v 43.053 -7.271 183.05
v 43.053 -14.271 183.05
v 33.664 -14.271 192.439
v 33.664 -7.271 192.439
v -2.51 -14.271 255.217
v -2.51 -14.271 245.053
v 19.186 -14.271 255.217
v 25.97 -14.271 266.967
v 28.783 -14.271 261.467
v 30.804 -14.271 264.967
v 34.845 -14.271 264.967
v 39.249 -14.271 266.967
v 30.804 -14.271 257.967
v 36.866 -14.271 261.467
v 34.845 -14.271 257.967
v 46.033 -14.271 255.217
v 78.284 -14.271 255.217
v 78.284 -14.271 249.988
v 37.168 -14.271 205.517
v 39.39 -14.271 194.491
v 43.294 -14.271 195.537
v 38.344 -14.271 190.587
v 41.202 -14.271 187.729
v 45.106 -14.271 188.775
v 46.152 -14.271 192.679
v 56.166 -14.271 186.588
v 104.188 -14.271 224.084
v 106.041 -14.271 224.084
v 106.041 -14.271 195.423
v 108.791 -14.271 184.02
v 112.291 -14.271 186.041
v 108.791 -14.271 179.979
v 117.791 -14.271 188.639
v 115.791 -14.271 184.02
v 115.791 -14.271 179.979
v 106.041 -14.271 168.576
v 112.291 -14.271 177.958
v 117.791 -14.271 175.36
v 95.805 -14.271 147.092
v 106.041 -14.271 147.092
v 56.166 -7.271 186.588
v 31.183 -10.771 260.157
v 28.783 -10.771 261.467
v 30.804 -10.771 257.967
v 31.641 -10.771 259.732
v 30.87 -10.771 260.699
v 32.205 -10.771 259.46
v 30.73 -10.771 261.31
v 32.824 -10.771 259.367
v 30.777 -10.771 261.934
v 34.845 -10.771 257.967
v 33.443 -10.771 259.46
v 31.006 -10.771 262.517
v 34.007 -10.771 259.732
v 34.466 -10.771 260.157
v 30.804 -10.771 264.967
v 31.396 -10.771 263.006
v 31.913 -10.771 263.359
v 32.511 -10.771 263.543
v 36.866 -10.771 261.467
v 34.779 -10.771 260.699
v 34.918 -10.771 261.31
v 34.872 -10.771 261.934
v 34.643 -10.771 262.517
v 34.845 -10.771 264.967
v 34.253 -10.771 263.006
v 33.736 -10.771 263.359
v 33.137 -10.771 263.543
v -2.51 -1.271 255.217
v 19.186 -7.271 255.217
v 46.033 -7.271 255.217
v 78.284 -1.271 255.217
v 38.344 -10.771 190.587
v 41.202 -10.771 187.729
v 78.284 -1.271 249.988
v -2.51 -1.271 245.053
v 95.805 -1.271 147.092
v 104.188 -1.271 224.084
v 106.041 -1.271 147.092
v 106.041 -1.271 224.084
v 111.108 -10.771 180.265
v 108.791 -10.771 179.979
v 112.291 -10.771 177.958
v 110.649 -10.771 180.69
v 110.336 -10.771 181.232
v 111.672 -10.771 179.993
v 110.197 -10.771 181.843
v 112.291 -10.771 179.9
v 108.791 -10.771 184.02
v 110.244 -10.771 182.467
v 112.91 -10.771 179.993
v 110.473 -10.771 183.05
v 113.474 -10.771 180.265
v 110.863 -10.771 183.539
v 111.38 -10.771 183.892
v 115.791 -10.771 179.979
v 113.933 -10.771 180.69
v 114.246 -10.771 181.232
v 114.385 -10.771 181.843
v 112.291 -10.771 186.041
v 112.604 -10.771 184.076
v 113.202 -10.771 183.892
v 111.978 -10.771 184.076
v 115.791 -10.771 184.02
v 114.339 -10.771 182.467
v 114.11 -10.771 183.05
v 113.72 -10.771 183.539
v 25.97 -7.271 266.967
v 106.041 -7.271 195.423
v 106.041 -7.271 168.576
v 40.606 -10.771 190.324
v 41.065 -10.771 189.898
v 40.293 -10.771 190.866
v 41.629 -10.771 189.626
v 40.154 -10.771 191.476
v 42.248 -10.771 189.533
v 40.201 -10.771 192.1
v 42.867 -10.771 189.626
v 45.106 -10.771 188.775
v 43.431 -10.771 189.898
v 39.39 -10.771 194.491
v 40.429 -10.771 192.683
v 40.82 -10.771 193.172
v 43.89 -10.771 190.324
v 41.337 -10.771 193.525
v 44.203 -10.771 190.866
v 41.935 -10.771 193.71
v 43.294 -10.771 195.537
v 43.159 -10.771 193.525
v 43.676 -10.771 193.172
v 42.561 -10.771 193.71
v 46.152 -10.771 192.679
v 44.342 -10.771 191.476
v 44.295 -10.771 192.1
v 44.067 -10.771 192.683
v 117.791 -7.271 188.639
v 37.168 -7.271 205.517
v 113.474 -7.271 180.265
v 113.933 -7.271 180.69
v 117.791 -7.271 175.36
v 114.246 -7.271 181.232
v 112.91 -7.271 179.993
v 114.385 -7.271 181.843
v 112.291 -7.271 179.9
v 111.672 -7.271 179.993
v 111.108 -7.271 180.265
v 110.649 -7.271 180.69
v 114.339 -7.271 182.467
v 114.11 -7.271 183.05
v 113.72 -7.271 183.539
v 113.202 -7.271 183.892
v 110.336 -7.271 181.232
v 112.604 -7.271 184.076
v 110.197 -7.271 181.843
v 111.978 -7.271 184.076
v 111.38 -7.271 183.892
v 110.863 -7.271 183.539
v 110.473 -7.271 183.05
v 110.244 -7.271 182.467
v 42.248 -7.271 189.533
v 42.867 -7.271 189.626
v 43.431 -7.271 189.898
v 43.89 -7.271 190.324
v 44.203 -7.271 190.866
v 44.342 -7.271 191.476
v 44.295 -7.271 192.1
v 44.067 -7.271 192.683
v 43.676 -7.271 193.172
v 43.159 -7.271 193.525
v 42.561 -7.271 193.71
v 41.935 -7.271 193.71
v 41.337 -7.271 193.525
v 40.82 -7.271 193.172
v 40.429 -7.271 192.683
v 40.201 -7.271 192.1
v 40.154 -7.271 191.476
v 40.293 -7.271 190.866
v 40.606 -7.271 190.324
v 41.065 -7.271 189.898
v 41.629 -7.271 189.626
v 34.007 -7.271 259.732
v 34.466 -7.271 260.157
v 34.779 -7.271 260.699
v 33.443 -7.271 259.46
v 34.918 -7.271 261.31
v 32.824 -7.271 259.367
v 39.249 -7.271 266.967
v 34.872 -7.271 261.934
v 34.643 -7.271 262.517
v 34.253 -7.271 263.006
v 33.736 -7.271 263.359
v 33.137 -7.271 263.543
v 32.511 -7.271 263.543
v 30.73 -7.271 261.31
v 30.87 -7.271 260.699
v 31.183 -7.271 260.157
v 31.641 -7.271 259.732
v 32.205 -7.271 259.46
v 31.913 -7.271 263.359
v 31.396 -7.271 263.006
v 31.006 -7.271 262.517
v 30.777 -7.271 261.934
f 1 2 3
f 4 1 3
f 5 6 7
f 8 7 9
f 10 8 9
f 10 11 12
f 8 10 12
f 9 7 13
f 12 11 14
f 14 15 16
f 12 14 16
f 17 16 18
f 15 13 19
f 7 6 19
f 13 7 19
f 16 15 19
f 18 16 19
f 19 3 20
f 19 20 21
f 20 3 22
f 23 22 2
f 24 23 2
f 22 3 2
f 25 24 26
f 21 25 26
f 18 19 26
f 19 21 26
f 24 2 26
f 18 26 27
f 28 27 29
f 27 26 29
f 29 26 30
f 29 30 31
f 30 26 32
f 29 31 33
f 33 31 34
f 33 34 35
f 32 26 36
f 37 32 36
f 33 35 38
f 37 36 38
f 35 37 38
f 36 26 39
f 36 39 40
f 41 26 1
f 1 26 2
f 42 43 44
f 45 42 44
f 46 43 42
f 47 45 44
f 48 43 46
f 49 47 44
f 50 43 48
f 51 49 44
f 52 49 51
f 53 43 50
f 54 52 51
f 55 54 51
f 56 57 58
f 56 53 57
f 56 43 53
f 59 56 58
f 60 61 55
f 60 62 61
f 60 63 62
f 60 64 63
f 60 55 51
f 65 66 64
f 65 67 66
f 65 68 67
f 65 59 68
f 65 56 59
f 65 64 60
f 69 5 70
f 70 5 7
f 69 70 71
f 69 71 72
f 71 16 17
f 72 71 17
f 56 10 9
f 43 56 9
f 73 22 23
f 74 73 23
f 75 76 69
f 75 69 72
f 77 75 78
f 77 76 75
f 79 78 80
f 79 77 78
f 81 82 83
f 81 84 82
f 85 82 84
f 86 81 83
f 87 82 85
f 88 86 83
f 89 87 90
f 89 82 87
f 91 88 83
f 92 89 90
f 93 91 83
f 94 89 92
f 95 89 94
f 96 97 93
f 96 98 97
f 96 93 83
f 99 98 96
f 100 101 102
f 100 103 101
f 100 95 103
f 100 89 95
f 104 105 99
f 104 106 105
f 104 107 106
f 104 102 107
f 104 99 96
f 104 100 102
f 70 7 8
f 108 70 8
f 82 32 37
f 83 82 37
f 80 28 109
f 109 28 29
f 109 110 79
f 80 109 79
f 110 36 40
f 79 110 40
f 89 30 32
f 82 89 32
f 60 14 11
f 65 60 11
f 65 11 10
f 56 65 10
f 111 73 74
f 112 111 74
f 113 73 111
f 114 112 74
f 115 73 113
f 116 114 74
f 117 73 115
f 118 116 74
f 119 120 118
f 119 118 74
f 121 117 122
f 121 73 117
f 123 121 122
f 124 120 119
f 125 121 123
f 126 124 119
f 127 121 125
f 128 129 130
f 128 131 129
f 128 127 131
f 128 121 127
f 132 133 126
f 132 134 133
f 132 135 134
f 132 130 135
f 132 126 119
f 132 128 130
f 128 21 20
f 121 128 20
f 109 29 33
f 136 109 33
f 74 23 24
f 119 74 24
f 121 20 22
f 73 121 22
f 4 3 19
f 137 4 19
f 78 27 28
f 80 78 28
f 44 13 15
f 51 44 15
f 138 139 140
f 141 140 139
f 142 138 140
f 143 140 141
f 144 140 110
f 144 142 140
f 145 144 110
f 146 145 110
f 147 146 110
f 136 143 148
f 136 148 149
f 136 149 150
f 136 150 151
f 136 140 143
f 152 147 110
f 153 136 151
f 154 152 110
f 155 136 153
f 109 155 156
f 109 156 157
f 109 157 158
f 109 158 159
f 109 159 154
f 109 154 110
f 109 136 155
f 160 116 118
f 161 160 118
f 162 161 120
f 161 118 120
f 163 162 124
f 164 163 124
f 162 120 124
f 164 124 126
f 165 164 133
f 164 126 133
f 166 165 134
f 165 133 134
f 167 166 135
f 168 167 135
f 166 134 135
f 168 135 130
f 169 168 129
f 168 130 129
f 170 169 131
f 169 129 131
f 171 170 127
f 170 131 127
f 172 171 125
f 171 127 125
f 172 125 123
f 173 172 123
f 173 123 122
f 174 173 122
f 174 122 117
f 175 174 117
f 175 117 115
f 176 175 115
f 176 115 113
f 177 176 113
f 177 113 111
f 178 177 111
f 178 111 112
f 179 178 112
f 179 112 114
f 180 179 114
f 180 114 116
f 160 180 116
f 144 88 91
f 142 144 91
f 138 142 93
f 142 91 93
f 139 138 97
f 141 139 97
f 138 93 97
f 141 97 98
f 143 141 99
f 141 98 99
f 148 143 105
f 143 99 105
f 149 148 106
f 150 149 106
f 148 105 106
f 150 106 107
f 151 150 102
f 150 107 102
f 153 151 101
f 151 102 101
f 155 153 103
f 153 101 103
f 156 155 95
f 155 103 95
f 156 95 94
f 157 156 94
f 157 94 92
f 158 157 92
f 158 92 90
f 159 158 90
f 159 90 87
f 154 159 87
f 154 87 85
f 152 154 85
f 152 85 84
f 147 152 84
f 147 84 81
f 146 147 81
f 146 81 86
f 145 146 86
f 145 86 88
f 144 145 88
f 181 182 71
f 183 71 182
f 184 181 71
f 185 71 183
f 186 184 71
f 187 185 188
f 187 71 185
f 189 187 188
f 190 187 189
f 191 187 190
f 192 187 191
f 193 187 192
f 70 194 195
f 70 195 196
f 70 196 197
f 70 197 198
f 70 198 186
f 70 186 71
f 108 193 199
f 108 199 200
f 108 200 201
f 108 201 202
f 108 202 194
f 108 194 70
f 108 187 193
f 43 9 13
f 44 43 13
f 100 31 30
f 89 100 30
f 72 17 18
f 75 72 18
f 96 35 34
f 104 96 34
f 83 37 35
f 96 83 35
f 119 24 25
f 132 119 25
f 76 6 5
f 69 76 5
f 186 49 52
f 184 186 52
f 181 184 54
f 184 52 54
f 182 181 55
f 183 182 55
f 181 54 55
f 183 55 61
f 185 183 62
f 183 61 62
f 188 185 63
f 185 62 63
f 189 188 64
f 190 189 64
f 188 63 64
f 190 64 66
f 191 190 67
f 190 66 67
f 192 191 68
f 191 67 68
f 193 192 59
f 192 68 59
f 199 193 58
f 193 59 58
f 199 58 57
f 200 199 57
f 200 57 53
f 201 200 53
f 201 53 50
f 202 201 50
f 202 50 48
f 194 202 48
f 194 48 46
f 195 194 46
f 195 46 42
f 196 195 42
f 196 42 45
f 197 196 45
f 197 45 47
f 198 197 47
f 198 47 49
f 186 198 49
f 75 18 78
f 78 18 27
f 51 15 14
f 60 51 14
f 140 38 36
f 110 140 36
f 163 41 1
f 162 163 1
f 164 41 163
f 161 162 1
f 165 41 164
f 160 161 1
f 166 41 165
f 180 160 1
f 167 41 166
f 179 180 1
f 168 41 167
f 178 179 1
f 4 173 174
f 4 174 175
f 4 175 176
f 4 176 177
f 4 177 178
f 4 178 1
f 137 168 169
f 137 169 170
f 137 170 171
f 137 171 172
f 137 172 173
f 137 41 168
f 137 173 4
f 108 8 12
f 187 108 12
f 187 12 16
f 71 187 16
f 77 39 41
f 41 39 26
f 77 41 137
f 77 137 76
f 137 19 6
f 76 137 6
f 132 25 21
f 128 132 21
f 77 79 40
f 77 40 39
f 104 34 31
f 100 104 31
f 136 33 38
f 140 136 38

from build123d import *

# Parameters (mm, degrees)
BOSS_EXTRUDE1_DEPTH = 13
BOSS_EXTRUDE2_DEPTH = 7
SKETCH3_R           = 2.1
CUT_EXTRUDE1_DEPTH  = 293.087257838
CUT_EXTRUDE2_DEPTH  = 3.5


with BuildPart() as part:
    # Sketch1 → Boss-Extrude1 (new body)
    with BuildSketch(Plane(origin=(0, -14.270631866, 0), x_dir=(-1, 0, 0), z_dir=(0, -1, 0))):
        Polygon((-95.804533303, -147.092026732), (2.510114699, -245.053270909), (2.510114699, -255.216605782), (-78.283971389, -255.216605782), (-78.283971389, -249.988254121), (-104.187777311, -224.084448198), (-106.041330702, -224.084448198), (-106.041330702, -147.092026732), align=None)
    extrude(amount=-BOSS_EXTRUDE1_DEPTH)

    # Sketch2 → Boss-Extrude2 (add)
    with BuildSketch(Plane.XZ.offset(14.270631866)):
        Polygon((37.243094616, 205.795877803), (-2.510114699, 245.406189427), (-2.510114699, 254.966605782), (19.041650219, 254.966605782), (25.96985345, 266.966605782), (39.248909641, 266.966605782), (46.177112871, 254.966605782), (78.033971389, 254.966605782), (78.033971389, 249.88470073), (104.084223921, 223.834448198), (105.791330702, 223.834448198), (105.791330702, 195.567357996), (117.791330702, 188.639154765), (117.791330702, 175.360098574), (105.791330702, 168.431895344), (105.791330702, 147.092026732), (96.158725005, 147.092026732), (56.444502381, 186.663491807), (43.053372765, 183.04954817), (33.664085816, 192.438835119), align=None)
    extrude(amount=-BOSS_EXTRUDE2_DEPTH)

    # Sketch3 → Cut-Extrude1 (cut, through all)
    with BuildSketch(Plane.XZ.offset(14.270631866)):
        with Locations(Location((42.248028453, 191.633067075, 0), (0, 0, 270))):
            Circle(SKETCH3_R)
        with Locations(Location((32.824351589, 261.466605782, 0), (0, 0, 270))):
            Circle(SKETCH3_R)
        with Locations(Location((112.291330702, 181.99962667, 0), (0, 0, 270))):
            Circle(SKETCH3_R)
    extrude(amount=-CUT_EXTRUDE1_DEPTH, mode=Mode.SUBTRACT)

    # Sketch4 → Cut-Extrude2 (cut)
    with BuildSketch(Plane.XZ.offset(14.270631866)):
        Polygon((36.865803473, 261.466605782), (34.845077531, 264.966605782), (30.803625647, 264.966605782), (28.782899705, 261.466605782), (30.803625647, 257.966605782), (34.845077531, 257.966605782), align=None)
        Polygon((46.151771204, 192.679071793), (43.29403317, 195.536809826), (39.39029042, 194.490805109), (38.344285702, 190.587062358), (41.202023735, 187.729324324), (45.105766486, 188.775329042), align=None)
        Polygon((108.791330702, 184.020352612), (108.791330702, 179.978900727), (112.291330702, 177.958174785), (115.791330702, 179.978900727), (115.791330702, 184.020352612), (112.291330702, 186.041078554), align=None)
    extrude(amount=-CUT_EXTRUDE2_DEPTH, mode=Mode.SUBTRACT)


solid = part.part
